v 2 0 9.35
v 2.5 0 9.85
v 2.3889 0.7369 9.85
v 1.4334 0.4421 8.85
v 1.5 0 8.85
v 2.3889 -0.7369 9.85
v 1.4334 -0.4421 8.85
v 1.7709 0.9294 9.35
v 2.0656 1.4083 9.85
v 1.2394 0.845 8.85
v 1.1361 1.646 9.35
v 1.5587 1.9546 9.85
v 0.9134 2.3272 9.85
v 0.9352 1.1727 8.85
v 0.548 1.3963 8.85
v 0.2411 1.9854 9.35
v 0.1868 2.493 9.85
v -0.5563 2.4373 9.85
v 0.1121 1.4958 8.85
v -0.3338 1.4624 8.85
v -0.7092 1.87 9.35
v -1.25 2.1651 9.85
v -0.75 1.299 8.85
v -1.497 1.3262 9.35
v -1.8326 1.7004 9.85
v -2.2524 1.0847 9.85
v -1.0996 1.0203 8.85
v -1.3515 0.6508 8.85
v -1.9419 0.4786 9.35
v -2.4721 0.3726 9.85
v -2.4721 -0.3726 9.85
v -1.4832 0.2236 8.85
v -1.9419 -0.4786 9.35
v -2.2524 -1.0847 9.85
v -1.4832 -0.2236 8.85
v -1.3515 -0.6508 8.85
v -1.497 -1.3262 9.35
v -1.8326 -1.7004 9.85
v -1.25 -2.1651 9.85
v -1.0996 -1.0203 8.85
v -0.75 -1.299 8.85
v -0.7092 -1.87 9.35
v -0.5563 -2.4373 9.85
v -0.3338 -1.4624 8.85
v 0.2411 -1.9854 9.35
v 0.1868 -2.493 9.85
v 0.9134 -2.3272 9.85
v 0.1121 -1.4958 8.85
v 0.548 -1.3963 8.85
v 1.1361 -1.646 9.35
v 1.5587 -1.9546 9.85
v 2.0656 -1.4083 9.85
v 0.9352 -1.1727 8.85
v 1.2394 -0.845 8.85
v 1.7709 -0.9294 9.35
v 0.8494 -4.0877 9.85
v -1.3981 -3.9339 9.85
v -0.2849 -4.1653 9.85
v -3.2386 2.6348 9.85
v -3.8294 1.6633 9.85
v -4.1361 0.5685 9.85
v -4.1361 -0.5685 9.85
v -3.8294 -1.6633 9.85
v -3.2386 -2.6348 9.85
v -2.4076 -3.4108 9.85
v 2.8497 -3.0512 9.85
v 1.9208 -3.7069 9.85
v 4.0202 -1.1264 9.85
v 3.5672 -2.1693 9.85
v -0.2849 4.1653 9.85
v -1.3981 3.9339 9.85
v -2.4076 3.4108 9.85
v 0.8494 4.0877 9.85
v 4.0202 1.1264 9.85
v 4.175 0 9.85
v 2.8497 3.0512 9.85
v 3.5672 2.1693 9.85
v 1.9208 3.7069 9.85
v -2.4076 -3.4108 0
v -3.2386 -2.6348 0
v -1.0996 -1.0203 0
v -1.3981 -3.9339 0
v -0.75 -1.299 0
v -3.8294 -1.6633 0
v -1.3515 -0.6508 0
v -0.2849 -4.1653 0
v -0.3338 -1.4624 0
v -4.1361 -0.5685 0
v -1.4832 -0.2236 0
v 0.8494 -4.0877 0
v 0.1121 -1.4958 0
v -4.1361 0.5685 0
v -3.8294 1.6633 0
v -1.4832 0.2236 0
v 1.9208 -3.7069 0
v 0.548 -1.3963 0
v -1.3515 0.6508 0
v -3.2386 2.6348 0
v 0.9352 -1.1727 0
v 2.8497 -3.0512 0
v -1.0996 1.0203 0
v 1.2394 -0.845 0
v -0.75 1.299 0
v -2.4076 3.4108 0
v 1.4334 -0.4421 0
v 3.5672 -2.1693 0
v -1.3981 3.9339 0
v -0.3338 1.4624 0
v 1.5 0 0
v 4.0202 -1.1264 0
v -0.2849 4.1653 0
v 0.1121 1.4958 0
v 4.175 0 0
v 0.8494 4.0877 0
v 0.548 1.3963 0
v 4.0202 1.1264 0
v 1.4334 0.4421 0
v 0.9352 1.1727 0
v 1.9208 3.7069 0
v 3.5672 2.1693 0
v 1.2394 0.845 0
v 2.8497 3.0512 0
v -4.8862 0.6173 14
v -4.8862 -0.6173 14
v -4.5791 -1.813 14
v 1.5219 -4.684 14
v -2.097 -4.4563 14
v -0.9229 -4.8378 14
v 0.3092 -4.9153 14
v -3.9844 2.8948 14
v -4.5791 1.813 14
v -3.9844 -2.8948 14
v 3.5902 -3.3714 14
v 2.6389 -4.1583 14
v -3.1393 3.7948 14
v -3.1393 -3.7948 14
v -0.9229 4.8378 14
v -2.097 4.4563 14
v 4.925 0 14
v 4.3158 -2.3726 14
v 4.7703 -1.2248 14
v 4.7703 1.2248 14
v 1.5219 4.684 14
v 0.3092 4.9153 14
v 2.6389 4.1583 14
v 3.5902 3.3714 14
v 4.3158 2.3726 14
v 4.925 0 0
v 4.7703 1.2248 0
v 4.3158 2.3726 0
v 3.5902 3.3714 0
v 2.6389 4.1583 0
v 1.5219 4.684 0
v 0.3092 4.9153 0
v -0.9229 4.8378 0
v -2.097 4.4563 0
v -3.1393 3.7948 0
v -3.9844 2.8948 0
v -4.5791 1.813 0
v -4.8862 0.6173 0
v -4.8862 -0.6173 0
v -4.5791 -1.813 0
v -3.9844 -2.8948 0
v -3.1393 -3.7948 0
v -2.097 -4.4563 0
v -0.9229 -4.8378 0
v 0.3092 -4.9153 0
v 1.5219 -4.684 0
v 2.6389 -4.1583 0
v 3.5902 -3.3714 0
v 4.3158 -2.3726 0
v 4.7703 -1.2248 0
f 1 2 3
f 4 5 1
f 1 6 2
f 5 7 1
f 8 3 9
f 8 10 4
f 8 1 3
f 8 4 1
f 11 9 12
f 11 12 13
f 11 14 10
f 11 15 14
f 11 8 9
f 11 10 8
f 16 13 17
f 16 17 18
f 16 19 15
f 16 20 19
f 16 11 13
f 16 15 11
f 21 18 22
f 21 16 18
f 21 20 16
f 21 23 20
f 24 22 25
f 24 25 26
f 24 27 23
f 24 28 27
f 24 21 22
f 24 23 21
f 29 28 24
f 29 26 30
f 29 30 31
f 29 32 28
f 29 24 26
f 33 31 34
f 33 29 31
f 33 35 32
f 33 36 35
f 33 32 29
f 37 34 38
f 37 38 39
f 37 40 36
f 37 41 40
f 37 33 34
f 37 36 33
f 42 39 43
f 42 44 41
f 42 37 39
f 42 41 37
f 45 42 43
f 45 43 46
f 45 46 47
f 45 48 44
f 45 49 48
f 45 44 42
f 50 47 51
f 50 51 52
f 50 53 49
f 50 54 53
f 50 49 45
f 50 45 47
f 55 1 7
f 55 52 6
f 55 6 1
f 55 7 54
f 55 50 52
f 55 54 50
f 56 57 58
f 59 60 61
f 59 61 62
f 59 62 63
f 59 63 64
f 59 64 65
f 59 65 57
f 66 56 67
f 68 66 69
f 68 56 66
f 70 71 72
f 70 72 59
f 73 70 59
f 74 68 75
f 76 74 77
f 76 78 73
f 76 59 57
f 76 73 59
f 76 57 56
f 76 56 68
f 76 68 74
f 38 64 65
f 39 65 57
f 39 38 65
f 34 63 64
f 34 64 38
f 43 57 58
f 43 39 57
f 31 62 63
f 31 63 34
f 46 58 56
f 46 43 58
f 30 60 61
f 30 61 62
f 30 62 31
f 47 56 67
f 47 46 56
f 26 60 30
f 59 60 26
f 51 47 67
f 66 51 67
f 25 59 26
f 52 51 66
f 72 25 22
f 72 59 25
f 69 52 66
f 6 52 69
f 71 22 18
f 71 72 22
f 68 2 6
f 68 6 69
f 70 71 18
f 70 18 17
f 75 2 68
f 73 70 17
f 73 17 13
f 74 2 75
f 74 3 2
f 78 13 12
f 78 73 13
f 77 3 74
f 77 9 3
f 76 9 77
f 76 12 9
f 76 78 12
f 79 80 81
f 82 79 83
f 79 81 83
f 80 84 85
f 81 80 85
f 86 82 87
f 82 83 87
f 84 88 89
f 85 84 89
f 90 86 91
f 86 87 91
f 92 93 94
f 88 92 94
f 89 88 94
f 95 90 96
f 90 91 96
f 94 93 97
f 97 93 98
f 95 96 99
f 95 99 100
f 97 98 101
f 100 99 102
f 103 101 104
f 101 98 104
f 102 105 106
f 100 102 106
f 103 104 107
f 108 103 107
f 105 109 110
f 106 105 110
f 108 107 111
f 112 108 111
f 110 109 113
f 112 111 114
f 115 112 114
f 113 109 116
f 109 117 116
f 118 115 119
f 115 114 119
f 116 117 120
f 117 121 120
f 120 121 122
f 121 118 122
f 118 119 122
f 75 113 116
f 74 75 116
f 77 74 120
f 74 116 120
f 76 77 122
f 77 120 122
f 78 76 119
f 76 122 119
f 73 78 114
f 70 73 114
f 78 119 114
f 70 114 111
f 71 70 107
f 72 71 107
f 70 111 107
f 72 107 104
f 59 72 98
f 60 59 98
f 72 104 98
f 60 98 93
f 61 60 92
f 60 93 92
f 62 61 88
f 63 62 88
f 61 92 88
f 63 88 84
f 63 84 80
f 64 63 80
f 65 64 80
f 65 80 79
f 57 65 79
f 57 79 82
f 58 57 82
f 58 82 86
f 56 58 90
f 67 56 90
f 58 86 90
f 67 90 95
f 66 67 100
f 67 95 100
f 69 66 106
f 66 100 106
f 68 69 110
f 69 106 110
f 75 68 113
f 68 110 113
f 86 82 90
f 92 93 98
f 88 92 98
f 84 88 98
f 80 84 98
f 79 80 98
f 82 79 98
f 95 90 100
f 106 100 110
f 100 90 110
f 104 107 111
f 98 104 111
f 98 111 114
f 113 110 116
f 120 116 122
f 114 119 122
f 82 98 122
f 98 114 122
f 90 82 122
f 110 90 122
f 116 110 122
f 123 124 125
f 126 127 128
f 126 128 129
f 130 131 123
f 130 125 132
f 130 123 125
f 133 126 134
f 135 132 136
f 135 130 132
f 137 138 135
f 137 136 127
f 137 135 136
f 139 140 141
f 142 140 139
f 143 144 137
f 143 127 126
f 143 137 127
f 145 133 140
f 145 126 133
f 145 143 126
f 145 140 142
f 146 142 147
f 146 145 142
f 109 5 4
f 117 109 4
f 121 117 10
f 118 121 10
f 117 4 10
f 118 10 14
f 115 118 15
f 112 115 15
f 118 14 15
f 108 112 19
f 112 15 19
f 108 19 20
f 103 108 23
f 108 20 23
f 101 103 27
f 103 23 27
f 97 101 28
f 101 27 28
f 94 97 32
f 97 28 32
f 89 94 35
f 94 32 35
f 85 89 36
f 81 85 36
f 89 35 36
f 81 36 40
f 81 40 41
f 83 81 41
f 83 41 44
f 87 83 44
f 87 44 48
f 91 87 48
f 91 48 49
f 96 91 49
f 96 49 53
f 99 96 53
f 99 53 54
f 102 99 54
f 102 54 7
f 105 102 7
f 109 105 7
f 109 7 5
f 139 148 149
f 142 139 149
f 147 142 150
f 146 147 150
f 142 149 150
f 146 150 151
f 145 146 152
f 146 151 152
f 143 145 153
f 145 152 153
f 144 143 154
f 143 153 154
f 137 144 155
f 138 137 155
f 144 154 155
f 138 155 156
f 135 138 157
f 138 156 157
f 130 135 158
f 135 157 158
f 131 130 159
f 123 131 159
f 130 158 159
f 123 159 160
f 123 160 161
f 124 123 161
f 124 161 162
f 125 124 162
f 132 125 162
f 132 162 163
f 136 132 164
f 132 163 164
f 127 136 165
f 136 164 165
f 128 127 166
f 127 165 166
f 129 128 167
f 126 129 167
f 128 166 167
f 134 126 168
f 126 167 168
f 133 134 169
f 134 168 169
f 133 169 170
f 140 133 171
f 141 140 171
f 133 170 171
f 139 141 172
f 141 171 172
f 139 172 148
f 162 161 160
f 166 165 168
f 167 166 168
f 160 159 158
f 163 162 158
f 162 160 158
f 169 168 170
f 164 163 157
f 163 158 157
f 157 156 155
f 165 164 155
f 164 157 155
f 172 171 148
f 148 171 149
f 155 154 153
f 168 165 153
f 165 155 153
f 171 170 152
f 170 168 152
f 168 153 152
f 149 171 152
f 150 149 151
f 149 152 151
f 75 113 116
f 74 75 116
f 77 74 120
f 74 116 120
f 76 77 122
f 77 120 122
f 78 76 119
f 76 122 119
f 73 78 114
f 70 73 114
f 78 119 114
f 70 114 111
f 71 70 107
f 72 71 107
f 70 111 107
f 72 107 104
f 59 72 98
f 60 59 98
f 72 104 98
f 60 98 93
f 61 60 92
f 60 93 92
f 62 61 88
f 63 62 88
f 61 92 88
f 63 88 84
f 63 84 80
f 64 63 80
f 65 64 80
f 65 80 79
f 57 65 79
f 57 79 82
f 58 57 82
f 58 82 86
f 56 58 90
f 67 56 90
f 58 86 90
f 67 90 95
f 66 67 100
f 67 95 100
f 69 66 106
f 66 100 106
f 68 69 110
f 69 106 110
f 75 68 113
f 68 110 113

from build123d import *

# Parameters (mm, degrees)
SKETCH_R        = 4.925
PAD_DEPTH       = 14
SKETCH002_R     = 4.175
PAD001_DEPTH    = 9.85
SKETCH003_R     = 1.5
POCKET001_DEPTH = 9.851
CHAMFER001_SIZE = 1
SKETCH004_R     = 4.175
PAD002_DEPTH    = 9.85


with BuildPart() as large:
    # Sketch (on XY_Plane of Origin) → Pad (new body)
    with BuildSketch(Plane.XY):
        Circle(SKETCH_R)
    extrude(amount=PAD_DEPTH)


with BuildPart() as small:
    # Sketch002 (on XY_Plane001 of Origin002) → Pad001 (new body)
    with BuildSketch(Plane.XY):
        Circle(SKETCH002_R)
    extrude(amount=PAD001_DEPTH)

    # Sketch003 (on Face3 of Pad001) → Pocket001 (cut, through all)
    with BuildSketch(Plane.XY.offset(9.85)):
        Circle(SKETCH003_R)
    extrude(amount=-POCKET001_DEPTH, mode=Mode.SUBTRACT)

    # Chamfer001
    chamfer001_edges = [small.edges().sort_by_distance(p)[0] for p in [
        (-1.5, 0, 9.85),
    ]]
    chamfer(chamfer001_edges, length=CHAMFER001_SIZE)


with BuildPart() as small001:
    # Sketch004 (on XY_Plane001 of Origin004) → Pad002 (new body)
    with BuildSketch(Plane.XY):
        Circle(SKETCH004_R)
    extrude(amount=PAD002_DEPTH)


solid = Compound([large.part, small.part, small001.part])
